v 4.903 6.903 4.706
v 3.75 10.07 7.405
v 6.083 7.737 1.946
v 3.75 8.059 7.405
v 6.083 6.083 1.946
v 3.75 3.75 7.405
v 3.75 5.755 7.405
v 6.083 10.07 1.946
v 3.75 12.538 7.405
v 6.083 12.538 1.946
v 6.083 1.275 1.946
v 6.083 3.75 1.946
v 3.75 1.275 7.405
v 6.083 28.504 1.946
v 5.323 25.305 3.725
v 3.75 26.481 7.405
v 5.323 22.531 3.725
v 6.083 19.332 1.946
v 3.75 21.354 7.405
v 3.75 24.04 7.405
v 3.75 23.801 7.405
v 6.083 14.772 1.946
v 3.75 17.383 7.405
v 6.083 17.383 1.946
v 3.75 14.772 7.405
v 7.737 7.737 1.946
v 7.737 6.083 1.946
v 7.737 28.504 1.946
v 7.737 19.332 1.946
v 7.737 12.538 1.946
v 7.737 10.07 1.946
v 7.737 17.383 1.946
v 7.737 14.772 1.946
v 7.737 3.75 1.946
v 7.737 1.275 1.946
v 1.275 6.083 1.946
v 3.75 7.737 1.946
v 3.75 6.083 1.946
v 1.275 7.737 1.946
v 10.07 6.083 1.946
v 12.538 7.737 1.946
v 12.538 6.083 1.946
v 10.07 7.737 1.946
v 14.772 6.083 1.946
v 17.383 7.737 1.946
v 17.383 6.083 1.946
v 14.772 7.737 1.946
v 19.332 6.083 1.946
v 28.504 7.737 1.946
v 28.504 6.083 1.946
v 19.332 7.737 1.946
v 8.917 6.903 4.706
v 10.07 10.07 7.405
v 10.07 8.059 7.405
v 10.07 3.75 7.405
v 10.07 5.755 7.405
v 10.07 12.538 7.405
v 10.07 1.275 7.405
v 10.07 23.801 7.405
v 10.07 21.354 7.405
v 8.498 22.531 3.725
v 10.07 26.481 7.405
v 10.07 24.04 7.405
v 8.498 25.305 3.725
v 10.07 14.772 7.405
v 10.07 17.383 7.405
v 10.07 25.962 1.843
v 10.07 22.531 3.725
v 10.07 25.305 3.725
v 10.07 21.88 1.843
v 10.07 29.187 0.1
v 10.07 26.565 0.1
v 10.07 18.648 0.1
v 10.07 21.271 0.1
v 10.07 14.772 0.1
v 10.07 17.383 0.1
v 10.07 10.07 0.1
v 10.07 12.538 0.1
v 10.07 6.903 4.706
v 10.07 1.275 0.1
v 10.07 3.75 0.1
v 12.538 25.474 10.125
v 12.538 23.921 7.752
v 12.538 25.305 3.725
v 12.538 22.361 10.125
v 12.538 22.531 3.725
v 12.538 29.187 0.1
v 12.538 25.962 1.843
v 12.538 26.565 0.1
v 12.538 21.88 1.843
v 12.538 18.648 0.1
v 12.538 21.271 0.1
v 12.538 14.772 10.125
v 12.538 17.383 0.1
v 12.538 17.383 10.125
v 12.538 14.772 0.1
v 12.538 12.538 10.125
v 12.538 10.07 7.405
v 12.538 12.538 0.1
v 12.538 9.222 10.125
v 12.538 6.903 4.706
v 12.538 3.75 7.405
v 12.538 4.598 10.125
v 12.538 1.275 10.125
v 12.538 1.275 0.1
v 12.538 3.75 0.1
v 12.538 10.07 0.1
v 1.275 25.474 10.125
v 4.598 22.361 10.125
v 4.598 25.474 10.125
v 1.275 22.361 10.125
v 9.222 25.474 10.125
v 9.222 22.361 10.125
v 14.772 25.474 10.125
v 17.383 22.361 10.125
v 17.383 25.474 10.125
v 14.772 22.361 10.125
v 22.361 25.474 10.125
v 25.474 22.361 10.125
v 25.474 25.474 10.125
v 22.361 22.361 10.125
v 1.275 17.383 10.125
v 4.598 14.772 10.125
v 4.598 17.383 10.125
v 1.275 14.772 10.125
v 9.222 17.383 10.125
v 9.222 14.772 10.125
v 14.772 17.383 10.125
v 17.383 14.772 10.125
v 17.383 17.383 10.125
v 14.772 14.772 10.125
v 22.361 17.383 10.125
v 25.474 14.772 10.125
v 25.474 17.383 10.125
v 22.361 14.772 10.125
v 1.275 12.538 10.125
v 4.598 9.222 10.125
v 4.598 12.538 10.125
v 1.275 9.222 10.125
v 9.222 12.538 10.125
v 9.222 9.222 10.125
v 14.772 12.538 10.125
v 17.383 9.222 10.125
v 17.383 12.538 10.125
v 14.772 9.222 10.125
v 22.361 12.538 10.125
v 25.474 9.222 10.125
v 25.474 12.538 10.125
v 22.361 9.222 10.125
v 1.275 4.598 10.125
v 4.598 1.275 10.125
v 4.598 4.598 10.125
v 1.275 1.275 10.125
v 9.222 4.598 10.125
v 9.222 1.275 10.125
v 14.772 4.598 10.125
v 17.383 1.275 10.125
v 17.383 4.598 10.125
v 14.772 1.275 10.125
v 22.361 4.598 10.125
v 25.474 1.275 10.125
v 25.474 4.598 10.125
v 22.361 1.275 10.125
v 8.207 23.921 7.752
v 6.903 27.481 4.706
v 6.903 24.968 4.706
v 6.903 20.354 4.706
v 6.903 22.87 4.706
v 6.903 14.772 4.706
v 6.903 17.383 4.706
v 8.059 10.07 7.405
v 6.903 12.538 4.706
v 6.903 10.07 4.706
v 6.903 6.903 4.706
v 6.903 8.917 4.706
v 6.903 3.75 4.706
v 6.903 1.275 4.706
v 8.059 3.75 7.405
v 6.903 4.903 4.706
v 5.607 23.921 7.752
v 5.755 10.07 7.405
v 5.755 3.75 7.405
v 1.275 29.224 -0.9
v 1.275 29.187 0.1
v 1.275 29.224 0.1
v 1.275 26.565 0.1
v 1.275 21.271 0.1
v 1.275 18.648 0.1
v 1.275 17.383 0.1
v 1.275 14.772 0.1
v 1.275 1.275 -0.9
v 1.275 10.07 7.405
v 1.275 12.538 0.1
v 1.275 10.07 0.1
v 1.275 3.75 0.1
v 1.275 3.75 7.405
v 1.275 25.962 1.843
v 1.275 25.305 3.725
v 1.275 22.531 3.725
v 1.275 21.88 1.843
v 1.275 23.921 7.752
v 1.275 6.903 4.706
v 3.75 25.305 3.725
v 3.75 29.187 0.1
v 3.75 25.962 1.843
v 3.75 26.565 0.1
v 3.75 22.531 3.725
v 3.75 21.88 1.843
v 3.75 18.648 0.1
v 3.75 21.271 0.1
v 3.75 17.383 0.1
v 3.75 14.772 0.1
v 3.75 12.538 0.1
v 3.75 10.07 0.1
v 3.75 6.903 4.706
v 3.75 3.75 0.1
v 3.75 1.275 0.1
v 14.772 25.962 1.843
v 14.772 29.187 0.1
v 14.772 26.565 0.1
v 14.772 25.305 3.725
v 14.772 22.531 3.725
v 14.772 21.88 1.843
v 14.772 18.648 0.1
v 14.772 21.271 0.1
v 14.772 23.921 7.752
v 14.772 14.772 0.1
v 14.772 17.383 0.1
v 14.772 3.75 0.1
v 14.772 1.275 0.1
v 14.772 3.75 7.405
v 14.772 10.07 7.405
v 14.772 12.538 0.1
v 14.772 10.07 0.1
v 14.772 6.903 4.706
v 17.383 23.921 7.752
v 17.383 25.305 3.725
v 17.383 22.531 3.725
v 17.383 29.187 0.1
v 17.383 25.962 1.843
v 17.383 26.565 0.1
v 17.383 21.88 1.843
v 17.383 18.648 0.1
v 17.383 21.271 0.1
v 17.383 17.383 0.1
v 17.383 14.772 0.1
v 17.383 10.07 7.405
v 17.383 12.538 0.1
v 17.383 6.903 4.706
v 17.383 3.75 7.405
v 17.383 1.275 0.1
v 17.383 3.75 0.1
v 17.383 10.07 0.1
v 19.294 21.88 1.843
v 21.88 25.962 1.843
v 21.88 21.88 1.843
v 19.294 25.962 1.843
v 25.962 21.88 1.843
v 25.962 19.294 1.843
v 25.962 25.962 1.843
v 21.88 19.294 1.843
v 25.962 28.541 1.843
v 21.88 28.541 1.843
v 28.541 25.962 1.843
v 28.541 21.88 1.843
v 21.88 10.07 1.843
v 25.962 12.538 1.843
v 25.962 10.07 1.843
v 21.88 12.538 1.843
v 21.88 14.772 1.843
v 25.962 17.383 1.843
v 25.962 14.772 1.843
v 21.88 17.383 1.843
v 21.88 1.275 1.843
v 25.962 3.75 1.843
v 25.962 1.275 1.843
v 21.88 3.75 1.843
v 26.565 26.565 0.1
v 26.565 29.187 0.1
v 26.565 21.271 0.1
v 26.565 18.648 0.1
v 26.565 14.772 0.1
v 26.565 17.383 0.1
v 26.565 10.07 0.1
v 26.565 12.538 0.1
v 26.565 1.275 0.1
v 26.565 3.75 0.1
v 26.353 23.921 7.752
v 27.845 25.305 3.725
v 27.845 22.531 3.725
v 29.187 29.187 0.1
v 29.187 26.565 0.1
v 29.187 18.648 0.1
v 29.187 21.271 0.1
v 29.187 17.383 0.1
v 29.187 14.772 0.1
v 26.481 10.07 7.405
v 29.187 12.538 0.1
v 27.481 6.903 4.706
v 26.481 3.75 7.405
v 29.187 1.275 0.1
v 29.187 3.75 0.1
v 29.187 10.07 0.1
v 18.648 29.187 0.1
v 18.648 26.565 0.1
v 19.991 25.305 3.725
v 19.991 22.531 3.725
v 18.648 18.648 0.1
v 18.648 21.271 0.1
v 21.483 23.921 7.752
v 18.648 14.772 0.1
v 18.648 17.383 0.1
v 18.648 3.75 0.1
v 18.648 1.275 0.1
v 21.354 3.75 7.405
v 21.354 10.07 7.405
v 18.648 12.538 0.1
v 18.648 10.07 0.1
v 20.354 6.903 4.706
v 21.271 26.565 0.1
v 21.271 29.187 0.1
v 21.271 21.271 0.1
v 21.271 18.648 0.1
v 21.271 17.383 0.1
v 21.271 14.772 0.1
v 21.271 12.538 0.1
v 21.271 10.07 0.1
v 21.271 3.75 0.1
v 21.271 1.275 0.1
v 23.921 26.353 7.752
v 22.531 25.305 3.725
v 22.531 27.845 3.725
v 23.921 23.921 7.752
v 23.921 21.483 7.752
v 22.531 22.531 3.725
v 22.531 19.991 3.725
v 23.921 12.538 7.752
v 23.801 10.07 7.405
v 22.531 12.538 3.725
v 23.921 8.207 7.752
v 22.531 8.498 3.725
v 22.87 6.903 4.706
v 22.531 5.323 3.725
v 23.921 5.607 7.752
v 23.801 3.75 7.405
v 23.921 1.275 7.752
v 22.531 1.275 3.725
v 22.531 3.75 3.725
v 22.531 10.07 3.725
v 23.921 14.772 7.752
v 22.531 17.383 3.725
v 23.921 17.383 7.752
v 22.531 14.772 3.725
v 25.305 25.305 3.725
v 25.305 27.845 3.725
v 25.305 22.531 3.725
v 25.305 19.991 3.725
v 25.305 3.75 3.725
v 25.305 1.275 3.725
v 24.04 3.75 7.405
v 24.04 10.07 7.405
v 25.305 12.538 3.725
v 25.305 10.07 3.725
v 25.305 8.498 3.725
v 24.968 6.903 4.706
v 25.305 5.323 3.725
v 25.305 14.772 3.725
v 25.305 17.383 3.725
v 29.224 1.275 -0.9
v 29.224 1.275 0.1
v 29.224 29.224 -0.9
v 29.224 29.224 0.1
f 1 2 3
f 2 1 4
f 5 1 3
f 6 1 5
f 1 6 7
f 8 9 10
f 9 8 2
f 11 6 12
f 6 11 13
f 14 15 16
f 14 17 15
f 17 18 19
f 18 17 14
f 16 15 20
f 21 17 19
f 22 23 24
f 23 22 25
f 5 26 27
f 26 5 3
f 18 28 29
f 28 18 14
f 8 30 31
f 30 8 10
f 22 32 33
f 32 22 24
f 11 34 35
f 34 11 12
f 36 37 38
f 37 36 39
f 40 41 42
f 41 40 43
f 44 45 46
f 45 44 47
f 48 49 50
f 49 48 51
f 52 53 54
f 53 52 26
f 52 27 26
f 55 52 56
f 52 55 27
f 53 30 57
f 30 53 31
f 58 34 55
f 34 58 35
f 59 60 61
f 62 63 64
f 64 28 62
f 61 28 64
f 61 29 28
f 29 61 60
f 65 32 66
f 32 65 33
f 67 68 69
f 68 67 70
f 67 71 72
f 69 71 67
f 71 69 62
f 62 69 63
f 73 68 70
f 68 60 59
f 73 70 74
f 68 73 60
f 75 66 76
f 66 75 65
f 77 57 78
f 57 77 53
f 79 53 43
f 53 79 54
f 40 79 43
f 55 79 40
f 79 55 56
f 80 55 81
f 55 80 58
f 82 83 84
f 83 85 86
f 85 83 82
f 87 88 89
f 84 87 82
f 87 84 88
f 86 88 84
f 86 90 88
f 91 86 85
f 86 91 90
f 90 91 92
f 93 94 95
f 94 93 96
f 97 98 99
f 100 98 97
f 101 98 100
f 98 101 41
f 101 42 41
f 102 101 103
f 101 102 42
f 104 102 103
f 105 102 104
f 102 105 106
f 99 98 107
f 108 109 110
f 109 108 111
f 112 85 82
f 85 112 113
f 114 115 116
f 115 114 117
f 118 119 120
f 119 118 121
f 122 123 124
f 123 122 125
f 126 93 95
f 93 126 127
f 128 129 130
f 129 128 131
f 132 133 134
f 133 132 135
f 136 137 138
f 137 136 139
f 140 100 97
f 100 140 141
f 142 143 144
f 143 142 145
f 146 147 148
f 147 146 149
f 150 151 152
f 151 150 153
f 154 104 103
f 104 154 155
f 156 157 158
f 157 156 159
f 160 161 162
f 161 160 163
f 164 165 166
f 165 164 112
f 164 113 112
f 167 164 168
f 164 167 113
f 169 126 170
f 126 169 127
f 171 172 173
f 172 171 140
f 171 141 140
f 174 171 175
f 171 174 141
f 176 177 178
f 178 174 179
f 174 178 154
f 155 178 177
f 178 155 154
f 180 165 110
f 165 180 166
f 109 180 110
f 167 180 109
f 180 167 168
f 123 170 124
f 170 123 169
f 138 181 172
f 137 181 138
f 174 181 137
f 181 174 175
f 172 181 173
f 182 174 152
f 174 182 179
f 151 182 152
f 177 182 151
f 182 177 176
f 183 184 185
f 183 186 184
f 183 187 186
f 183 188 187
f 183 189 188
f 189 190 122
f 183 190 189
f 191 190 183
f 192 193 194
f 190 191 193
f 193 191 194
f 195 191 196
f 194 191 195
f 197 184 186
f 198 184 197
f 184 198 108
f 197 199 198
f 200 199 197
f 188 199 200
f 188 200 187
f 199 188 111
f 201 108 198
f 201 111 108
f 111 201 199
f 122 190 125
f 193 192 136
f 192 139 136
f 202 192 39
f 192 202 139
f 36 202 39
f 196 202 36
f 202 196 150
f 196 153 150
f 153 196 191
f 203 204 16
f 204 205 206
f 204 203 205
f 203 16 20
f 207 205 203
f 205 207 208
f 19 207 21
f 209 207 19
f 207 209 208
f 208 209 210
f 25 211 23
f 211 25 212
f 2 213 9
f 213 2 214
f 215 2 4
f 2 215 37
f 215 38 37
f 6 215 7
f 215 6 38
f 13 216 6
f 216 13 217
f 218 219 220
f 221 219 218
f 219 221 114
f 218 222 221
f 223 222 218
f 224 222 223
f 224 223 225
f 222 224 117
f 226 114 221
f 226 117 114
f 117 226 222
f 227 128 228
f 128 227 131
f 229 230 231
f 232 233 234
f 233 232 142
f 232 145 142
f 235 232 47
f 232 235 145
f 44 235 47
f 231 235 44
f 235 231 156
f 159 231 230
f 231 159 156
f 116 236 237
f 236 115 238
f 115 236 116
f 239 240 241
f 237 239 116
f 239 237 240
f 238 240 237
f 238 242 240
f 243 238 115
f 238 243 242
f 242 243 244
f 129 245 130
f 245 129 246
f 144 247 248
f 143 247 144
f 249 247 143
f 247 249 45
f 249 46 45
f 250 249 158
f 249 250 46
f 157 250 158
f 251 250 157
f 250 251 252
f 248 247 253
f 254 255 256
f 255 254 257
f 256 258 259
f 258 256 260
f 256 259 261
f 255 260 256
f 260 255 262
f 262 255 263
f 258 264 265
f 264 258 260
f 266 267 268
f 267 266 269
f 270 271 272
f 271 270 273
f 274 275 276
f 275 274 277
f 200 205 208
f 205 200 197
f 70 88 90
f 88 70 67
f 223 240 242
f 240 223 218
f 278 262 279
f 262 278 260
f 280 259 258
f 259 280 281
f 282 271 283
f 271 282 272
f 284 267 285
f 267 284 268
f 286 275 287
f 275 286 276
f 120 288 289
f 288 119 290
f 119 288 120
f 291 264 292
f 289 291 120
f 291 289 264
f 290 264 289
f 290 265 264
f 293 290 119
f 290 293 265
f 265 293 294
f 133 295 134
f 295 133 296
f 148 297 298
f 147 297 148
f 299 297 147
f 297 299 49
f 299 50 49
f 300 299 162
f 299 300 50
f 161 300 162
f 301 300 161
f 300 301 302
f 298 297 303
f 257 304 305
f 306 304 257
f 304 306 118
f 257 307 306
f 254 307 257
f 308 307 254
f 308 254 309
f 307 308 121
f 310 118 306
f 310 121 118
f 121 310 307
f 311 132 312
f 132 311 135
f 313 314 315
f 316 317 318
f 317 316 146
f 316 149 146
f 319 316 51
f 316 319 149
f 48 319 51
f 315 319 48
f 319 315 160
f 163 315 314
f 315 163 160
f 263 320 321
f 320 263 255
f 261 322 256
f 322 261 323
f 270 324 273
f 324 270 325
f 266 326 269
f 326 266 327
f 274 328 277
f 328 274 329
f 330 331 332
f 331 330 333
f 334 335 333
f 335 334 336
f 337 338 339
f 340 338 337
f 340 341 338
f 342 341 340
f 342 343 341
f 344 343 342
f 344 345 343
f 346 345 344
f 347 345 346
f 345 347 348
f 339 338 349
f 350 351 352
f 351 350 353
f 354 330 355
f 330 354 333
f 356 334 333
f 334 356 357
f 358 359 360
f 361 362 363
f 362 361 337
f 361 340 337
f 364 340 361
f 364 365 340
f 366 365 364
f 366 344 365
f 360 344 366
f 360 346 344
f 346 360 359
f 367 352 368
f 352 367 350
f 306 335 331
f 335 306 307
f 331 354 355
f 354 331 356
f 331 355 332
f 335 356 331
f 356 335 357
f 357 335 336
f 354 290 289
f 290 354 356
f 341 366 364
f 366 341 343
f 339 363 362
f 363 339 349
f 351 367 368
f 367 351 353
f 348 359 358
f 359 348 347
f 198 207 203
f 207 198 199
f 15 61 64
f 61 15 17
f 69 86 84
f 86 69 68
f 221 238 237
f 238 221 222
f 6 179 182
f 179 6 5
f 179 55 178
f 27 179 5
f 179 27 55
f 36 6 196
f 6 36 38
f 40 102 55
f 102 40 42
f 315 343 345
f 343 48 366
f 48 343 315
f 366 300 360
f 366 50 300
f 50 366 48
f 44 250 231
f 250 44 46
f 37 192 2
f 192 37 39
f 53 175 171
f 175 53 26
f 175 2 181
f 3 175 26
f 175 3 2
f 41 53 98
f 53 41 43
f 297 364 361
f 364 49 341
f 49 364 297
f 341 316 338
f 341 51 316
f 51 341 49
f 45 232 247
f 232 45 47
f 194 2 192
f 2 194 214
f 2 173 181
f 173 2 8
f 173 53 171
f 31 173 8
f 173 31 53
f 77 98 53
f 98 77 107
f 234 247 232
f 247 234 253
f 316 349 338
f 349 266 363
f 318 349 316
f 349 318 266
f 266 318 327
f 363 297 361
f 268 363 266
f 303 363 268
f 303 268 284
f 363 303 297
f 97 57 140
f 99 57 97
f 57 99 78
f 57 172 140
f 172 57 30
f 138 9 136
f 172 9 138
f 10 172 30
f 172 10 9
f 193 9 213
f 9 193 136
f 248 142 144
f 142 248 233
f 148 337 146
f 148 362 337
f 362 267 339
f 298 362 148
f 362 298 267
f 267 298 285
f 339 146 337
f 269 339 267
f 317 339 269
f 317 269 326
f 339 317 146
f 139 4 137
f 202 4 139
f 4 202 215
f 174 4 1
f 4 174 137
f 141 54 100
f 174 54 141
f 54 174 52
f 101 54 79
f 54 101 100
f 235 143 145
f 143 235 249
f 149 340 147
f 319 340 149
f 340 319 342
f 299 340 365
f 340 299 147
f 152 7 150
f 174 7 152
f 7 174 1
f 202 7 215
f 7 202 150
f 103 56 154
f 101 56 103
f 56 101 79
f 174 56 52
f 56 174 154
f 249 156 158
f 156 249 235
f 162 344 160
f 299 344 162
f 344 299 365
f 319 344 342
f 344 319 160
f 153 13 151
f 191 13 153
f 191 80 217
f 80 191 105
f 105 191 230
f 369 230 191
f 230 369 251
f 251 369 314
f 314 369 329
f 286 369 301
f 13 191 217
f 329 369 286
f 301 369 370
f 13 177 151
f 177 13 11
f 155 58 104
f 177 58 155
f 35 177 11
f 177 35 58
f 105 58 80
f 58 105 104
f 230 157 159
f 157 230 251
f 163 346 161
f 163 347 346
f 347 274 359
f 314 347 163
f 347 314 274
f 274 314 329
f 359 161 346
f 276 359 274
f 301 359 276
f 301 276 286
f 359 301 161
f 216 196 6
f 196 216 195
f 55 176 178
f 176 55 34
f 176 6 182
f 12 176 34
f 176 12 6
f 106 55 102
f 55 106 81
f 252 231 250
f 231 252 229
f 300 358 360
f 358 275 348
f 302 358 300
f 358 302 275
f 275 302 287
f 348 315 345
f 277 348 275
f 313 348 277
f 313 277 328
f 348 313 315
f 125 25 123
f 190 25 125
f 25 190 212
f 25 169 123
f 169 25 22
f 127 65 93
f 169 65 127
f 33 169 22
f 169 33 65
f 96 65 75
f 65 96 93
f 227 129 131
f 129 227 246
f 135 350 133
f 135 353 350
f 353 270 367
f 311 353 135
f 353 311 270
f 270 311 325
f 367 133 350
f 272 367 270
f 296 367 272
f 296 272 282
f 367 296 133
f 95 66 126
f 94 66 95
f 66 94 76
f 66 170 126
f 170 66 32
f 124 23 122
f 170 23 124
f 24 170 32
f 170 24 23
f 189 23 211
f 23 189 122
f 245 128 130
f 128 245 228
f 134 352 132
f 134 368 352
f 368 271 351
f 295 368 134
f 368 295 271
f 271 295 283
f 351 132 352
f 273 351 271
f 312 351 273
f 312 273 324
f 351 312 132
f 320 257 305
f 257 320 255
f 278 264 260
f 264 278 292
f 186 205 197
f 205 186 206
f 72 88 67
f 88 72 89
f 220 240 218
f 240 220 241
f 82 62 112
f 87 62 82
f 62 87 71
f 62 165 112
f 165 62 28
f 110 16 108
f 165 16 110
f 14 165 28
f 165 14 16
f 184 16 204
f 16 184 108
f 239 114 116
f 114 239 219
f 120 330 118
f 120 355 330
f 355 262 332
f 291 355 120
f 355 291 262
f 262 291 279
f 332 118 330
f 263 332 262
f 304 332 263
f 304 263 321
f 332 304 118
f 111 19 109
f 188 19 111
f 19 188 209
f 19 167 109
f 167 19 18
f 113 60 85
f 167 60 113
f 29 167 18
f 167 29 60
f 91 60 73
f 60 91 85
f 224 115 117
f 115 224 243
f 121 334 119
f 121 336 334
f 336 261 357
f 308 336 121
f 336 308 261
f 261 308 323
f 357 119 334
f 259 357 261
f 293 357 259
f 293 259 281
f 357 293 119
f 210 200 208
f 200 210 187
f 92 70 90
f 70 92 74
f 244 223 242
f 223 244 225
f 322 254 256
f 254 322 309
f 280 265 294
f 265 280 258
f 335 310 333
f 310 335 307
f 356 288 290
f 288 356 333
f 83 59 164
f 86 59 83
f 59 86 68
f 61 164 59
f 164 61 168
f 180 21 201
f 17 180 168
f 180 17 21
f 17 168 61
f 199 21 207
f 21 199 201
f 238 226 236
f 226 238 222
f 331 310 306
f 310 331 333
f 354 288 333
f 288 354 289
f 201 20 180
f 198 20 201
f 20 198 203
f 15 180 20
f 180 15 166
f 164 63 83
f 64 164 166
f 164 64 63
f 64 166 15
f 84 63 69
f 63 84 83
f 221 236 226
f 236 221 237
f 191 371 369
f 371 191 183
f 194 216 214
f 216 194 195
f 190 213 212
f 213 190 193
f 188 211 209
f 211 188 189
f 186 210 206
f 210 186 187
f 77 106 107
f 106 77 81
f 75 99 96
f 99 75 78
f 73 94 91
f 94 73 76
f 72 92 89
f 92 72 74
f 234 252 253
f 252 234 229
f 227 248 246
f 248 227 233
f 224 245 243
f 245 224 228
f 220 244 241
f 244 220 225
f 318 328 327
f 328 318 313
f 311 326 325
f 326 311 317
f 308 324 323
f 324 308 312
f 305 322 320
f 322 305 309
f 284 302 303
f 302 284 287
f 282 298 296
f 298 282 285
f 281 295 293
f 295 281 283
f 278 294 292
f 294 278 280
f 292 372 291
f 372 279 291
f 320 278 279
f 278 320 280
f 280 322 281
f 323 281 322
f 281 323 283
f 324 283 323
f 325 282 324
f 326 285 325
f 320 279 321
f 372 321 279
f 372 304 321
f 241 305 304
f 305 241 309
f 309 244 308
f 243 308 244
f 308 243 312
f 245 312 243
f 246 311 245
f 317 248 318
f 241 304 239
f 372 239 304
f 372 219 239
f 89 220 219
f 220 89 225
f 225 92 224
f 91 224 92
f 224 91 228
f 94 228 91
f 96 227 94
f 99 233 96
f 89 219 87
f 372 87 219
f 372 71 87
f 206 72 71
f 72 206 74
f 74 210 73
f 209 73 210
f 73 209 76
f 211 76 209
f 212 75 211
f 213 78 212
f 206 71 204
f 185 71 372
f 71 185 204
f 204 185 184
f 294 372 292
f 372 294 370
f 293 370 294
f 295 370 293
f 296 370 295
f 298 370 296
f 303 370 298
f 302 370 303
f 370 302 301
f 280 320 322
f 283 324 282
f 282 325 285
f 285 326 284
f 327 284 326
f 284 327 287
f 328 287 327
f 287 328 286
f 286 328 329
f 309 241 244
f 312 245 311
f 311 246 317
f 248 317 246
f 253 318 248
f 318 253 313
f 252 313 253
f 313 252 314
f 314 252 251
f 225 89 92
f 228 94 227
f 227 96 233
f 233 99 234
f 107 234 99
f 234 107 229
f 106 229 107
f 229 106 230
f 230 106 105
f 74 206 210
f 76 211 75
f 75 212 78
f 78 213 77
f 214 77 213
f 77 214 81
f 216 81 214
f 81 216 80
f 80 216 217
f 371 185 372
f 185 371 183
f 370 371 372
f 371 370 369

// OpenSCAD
text1 = "MIA";
text2 = "MIA";
// See https://en.wikibooks.org/wiki/OpenSCAD_User_Manual/Using_the_2D_Subsystem#Using_Fonts_.26_Styles
text_font = "DejaVu Sans:style=Bold";
offset_angle = 90; // [0:90]
base_thickness = 1;


module letters() {
     rotate([90, 0, 0])
     render(convexity=10)
     intersection() {
	  translate([0, 0, -500]) linear_extrude(1000) text(text1, font=text_font);
	  rotate([0, offset_angle, 0]) translate([0, 0, -500]) linear_extrude(1000) text(text2, font=text_font);
     }
}

module base() {
     translate([0, 0, -base_thickness + 0.1]) linear_extrude(base_thickness) hull() projection() letters();
}

union() {
     base();
     letters();
}
